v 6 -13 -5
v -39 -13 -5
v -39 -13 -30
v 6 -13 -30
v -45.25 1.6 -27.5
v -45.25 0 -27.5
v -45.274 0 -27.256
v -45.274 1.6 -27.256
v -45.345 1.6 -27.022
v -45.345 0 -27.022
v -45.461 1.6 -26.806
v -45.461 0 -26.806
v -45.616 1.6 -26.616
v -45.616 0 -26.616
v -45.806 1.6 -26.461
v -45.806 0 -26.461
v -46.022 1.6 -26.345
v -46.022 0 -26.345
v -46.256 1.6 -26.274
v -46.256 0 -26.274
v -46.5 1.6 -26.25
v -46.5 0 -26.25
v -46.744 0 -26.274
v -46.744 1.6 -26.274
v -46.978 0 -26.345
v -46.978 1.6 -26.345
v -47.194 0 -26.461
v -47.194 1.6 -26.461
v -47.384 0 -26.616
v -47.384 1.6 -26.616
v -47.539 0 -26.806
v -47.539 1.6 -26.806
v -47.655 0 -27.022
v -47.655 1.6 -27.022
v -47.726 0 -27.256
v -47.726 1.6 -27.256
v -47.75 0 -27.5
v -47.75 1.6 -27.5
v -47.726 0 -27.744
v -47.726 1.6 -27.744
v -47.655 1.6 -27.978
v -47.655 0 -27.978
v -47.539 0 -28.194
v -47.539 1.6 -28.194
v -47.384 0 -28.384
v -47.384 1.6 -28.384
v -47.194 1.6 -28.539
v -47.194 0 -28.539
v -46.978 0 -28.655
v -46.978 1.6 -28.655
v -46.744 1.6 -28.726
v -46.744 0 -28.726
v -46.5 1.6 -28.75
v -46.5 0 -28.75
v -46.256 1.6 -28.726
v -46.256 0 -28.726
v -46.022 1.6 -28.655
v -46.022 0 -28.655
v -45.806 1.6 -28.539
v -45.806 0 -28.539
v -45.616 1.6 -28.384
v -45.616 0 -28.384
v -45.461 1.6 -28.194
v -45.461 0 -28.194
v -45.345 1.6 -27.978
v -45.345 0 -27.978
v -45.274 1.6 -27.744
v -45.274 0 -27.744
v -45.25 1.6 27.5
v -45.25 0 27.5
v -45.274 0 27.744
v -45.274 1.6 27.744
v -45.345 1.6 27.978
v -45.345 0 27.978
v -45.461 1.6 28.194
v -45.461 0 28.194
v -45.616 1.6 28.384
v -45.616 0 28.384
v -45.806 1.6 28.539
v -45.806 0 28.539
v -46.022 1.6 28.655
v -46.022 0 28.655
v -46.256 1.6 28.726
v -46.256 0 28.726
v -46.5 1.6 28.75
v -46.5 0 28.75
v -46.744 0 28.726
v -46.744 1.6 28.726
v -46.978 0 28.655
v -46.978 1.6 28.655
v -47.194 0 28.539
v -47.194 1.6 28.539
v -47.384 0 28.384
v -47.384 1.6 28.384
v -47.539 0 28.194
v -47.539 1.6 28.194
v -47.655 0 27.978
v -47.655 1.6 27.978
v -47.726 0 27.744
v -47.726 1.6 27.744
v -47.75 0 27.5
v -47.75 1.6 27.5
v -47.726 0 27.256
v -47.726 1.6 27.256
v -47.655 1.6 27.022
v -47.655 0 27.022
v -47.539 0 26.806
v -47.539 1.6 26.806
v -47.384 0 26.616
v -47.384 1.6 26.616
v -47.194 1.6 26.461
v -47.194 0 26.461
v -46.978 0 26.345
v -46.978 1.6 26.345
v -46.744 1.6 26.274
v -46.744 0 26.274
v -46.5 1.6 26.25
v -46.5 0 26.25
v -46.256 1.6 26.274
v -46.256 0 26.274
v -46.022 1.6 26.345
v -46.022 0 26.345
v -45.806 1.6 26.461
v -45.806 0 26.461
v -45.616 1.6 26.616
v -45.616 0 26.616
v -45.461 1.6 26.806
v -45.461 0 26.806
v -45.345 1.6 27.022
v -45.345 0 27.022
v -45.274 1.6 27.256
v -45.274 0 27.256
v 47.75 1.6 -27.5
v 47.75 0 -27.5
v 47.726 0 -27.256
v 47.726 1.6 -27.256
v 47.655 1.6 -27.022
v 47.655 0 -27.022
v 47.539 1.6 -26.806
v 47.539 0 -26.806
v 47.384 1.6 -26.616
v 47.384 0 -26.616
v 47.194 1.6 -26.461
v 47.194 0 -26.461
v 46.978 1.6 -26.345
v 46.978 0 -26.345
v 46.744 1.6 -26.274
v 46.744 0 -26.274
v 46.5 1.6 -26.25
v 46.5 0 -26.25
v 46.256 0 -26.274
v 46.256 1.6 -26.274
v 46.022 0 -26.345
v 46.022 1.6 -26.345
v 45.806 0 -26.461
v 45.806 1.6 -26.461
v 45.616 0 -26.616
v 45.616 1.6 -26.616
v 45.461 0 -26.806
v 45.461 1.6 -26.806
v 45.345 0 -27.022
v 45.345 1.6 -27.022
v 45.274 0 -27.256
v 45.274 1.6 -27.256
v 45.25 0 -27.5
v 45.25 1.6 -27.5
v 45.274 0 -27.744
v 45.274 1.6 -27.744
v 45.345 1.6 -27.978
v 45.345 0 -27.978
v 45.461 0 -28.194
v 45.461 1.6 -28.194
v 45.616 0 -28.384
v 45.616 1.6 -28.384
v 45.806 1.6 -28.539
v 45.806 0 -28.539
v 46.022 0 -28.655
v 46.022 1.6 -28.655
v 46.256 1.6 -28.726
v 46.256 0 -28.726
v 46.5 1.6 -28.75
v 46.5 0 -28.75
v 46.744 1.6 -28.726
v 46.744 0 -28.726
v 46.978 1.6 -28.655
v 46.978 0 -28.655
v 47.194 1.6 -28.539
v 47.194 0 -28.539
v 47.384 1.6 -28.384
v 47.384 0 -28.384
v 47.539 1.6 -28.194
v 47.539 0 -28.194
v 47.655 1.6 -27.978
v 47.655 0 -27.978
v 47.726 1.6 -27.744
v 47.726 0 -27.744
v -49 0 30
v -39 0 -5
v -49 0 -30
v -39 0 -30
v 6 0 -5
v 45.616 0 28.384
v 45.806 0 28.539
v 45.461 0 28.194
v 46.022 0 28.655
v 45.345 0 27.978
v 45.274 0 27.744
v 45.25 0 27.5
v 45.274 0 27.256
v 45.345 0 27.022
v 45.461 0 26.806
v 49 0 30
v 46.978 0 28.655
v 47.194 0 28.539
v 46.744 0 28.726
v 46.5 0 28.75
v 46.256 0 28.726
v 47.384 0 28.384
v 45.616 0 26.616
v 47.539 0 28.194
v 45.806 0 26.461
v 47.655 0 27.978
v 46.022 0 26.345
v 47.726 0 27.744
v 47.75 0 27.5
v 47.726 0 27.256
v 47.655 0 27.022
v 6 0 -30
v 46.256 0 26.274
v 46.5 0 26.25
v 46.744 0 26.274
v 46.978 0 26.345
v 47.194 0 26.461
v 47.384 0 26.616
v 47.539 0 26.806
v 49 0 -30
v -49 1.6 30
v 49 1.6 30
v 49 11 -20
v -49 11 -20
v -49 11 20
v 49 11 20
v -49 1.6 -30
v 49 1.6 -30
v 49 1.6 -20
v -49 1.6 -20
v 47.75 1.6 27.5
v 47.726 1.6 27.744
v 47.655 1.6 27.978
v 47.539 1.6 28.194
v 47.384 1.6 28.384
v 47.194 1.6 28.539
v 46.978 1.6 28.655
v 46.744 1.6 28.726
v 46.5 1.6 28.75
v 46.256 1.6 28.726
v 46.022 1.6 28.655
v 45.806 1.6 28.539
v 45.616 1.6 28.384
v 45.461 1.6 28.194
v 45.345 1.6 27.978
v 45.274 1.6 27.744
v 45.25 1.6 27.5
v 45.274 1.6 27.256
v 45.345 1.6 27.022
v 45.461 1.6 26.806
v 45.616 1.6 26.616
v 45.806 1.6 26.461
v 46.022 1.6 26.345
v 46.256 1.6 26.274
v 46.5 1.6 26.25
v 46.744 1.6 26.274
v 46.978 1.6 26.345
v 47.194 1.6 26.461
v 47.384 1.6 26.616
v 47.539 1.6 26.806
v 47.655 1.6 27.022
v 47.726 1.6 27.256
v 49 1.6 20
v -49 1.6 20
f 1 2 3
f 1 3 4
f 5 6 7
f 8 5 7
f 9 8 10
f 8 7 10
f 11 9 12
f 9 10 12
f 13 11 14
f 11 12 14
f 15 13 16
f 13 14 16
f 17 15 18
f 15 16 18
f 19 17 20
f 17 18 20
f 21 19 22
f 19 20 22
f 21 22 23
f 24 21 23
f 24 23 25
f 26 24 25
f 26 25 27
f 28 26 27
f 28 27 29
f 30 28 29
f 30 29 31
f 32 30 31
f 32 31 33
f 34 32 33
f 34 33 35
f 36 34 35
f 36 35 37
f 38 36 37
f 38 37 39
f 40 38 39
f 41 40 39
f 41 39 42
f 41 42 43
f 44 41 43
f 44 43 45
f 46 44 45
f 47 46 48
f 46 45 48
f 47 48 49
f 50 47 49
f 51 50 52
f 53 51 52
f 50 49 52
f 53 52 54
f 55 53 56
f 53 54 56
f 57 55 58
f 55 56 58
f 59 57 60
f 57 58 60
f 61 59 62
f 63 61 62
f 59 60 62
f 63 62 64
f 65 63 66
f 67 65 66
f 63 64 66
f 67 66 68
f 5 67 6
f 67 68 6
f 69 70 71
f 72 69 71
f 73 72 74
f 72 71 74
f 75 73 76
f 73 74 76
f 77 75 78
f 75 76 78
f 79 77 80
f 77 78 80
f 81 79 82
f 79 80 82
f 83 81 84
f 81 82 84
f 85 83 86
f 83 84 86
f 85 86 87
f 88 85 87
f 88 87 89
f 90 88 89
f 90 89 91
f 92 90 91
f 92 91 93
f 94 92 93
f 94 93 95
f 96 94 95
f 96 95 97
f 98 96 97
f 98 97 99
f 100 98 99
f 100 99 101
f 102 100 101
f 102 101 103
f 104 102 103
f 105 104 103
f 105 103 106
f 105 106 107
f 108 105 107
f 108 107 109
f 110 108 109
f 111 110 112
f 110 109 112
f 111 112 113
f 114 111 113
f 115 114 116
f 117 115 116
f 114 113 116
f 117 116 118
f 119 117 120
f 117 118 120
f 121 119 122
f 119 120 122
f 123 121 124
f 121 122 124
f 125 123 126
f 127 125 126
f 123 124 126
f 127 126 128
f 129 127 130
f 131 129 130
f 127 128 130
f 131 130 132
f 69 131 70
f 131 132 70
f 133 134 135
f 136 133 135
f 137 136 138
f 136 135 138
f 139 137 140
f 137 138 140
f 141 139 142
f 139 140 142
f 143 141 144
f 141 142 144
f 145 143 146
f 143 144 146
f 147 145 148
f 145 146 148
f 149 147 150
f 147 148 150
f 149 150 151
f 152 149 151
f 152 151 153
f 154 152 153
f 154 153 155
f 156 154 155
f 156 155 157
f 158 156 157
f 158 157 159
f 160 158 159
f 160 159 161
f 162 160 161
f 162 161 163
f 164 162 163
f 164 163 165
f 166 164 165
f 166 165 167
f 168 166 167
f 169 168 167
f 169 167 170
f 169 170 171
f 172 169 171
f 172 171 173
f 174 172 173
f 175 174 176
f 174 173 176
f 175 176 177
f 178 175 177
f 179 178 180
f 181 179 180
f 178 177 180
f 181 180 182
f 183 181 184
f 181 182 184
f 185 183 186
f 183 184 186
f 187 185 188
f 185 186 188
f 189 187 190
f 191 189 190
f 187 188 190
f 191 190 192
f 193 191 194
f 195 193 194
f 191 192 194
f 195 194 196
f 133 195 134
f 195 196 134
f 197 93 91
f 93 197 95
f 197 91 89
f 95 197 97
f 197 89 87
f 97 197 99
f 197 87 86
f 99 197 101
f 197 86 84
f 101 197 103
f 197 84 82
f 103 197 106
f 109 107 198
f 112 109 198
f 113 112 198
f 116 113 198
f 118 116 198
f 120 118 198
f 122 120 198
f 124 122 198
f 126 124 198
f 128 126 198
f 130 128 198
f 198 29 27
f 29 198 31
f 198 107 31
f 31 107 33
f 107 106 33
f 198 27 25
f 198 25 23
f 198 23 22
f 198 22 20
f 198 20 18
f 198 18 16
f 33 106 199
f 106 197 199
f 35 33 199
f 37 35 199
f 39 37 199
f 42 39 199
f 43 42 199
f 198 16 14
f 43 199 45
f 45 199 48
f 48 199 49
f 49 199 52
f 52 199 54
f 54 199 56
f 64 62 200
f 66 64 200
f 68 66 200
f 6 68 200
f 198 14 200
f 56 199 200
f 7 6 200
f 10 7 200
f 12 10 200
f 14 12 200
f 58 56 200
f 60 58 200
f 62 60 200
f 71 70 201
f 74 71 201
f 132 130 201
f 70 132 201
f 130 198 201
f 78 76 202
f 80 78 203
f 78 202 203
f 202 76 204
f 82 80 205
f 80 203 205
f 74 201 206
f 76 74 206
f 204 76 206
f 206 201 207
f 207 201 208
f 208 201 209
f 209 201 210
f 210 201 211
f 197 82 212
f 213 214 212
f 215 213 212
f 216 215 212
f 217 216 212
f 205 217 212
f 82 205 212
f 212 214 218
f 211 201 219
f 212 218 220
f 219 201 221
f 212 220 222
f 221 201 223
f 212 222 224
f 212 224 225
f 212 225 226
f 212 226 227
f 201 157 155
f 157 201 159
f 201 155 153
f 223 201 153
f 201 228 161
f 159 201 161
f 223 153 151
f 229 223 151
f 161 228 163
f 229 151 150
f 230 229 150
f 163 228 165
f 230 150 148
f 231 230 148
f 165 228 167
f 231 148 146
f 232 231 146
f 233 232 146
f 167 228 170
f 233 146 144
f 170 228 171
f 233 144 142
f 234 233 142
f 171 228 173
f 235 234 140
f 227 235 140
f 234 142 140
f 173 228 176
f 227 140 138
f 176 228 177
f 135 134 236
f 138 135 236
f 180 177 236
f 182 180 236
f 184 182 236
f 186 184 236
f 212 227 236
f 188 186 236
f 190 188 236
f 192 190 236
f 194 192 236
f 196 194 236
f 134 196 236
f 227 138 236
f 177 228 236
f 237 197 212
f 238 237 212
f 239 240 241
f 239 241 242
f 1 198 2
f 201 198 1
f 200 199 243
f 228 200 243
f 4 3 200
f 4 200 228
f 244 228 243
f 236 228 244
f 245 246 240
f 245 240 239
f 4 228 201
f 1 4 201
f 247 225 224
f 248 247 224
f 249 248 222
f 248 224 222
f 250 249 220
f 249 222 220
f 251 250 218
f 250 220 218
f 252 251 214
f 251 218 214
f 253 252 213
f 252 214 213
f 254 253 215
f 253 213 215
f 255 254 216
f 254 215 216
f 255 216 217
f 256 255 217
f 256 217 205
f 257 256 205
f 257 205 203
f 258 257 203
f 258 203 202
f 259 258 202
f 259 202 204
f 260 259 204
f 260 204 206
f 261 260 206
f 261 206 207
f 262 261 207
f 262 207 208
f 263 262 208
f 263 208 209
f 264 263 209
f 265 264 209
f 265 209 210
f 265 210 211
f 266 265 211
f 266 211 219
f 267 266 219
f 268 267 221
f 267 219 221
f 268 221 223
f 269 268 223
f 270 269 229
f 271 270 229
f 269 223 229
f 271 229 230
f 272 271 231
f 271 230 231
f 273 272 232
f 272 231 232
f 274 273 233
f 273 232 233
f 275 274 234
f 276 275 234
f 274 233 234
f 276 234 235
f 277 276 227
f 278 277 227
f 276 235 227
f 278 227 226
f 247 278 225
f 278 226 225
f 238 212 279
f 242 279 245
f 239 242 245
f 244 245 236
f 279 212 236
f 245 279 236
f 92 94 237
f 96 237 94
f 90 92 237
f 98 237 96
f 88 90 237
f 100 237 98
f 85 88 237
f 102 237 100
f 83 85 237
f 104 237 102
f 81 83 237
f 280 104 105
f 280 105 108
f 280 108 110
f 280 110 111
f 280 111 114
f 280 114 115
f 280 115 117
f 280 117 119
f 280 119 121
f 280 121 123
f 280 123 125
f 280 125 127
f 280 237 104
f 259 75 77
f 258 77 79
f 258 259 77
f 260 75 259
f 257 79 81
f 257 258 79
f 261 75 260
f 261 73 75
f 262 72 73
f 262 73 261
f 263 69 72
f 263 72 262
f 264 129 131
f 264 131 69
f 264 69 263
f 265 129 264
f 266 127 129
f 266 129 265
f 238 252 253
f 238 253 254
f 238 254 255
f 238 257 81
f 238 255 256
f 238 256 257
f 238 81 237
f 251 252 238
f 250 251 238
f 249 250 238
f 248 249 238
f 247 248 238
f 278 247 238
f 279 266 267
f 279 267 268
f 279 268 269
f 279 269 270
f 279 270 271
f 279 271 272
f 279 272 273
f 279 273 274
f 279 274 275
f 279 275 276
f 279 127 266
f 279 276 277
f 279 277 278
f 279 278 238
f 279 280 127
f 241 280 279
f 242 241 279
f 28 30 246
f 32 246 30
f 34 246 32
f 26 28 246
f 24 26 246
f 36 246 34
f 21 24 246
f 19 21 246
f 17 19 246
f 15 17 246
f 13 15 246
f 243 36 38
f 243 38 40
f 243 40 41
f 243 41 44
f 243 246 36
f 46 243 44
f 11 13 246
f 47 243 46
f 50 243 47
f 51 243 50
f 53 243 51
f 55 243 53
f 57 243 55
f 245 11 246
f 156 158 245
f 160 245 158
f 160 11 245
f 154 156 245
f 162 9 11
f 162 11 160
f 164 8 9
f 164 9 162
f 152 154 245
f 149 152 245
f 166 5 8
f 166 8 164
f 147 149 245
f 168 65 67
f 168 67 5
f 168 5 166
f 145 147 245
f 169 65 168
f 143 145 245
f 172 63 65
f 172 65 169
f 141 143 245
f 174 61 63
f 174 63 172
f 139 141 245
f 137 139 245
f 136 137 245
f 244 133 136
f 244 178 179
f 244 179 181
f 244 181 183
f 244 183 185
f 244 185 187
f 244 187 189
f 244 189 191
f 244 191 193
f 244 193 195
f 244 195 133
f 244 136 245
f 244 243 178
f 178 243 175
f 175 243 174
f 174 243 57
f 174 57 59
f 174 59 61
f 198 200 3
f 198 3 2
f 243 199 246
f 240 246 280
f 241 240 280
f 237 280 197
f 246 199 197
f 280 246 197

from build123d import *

# Parameters (mm, degrees)
SKETCH_1_W          = 98
SKETCH_1_H          = 60
EXTRUDE_1_DEPTH     = 1.6
SKETCH_1_4_W        = 98
SKETCH_1_4_H        = 40
EXTRUDE_2_DEPTH     = 11
SKETCH_2_W          = 45
SKETCH_2_H          = 25
EXTRUDE_3_DEPTH     = 13
CUT_EXTRUDE_1_REACH = 60.907
SKETCH_3_R          = 1.25


with BuildPart() as part:
    # Эскиз1 → Бобышка-Вытянуть1 (new body)
    with BuildSketch(Plane(origin=(0, 0, 0), x_dir=(1, 0, 0), z_dir=(0, 1, 0))):
        Rectangle(SKETCH_1_W, SKETCH_1_H)
    extrude(amount=EXTRUDE_1_DEPTH)

    # Эскиз1<4> → Бобышка-Вытянуть2 (add)
    with BuildSketch(Plane(origin=(0, 0, 0), x_dir=(1, 0, 0), z_dir=(0, 1, 0))):
        Rectangle(SKETCH_1_4_W, SKETCH_1_4_H)
    extrude(amount=EXTRUDE_2_DEPTH)

    # Эскиз2 → Бобышка-Вытянуть3 (add)
    with BuildSketch(Plane.XZ):
        with Locations((-16.5, -17.5)):
            Rectangle(SKETCH_2_W, SKETCH_2_H)
    extrude(amount=EXTRUDE_3_DEPTH)

    # Эскиз3 → Вырез-Вытянуть1 (cut, up to next)
    with BuildSketch(Plane.XZ, mode=Mode.PRIVATE) as cut_extrude_1_sk1:
        with Locations((46.5, 27.5)):
            Circle(SKETCH_3_R)
    cut_extrude_1_tool1 = extrude(cut_extrude_1_sk1.sketch, amount=-CUT_EXTRUDE_1_REACH, mode=Mode.PRIVATE) & part.part
    # Эскиз3 → Вырез-Вытянуть1 (cut, up to next)
    with BuildSketch(Plane.XZ, mode=Mode.PRIVATE) as cut_extrude_1_sk2:
        with Locations((-46.5, 27.5)):
            Circle(SKETCH_3_R)
    cut_extrude_1_tool2 = extrude(cut_extrude_1_sk2.sketch, amount=-CUT_EXTRUDE_1_REACH, mode=Mode.PRIVATE) & part.part
    # Эскиз3 → Вырез-Вытянуть1 (cut, up to next)
    with BuildSketch(Plane.XZ, mode=Mode.PRIVATE) as cut_extrude_1_sk3:
        with Locations((-46.5, -27.5)):
            Circle(SKETCH_3_R)
    cut_extrude_1_tool3 = extrude(cut_extrude_1_sk3.sketch, amount=-CUT_EXTRUDE_1_REACH, mode=Mode.PRIVATE) & part.part
    # Эскиз3 → Вырез-Вытянуть1 (cut, up to next)
    with BuildSketch(Plane.XZ, mode=Mode.PRIVATE) as cut_extrude_1_sk4:
        with Locations((46.5, -27.5)):
            Circle(SKETCH_3_R)
    cut_extrude_1_tool4 = extrude(cut_extrude_1_sk4.sketch, amount=-CUT_EXTRUDE_1_REACH, mode=Mode.PRIVATE) & part.part
    add(cut_extrude_1_tool1.solids().sort_by_distance((46.5, 0, 27.5))[0], mode=Mode.SUBTRACT)
    add(cut_extrude_1_tool2.solids().sort_by_distance((-46.5, 0, 27.5))[0], mode=Mode.SUBTRACT)
    add(cut_extrude_1_tool3.solids().sort_by_distance((-46.5, 0, -27.5))[0], mode=Mode.SUBTRACT)
    add(cut_extrude_1_tool4.solids().sort_by_distance((46.5, 0, -27.5))[0], mode=Mode.SUBTRACT)


solid = part.part
